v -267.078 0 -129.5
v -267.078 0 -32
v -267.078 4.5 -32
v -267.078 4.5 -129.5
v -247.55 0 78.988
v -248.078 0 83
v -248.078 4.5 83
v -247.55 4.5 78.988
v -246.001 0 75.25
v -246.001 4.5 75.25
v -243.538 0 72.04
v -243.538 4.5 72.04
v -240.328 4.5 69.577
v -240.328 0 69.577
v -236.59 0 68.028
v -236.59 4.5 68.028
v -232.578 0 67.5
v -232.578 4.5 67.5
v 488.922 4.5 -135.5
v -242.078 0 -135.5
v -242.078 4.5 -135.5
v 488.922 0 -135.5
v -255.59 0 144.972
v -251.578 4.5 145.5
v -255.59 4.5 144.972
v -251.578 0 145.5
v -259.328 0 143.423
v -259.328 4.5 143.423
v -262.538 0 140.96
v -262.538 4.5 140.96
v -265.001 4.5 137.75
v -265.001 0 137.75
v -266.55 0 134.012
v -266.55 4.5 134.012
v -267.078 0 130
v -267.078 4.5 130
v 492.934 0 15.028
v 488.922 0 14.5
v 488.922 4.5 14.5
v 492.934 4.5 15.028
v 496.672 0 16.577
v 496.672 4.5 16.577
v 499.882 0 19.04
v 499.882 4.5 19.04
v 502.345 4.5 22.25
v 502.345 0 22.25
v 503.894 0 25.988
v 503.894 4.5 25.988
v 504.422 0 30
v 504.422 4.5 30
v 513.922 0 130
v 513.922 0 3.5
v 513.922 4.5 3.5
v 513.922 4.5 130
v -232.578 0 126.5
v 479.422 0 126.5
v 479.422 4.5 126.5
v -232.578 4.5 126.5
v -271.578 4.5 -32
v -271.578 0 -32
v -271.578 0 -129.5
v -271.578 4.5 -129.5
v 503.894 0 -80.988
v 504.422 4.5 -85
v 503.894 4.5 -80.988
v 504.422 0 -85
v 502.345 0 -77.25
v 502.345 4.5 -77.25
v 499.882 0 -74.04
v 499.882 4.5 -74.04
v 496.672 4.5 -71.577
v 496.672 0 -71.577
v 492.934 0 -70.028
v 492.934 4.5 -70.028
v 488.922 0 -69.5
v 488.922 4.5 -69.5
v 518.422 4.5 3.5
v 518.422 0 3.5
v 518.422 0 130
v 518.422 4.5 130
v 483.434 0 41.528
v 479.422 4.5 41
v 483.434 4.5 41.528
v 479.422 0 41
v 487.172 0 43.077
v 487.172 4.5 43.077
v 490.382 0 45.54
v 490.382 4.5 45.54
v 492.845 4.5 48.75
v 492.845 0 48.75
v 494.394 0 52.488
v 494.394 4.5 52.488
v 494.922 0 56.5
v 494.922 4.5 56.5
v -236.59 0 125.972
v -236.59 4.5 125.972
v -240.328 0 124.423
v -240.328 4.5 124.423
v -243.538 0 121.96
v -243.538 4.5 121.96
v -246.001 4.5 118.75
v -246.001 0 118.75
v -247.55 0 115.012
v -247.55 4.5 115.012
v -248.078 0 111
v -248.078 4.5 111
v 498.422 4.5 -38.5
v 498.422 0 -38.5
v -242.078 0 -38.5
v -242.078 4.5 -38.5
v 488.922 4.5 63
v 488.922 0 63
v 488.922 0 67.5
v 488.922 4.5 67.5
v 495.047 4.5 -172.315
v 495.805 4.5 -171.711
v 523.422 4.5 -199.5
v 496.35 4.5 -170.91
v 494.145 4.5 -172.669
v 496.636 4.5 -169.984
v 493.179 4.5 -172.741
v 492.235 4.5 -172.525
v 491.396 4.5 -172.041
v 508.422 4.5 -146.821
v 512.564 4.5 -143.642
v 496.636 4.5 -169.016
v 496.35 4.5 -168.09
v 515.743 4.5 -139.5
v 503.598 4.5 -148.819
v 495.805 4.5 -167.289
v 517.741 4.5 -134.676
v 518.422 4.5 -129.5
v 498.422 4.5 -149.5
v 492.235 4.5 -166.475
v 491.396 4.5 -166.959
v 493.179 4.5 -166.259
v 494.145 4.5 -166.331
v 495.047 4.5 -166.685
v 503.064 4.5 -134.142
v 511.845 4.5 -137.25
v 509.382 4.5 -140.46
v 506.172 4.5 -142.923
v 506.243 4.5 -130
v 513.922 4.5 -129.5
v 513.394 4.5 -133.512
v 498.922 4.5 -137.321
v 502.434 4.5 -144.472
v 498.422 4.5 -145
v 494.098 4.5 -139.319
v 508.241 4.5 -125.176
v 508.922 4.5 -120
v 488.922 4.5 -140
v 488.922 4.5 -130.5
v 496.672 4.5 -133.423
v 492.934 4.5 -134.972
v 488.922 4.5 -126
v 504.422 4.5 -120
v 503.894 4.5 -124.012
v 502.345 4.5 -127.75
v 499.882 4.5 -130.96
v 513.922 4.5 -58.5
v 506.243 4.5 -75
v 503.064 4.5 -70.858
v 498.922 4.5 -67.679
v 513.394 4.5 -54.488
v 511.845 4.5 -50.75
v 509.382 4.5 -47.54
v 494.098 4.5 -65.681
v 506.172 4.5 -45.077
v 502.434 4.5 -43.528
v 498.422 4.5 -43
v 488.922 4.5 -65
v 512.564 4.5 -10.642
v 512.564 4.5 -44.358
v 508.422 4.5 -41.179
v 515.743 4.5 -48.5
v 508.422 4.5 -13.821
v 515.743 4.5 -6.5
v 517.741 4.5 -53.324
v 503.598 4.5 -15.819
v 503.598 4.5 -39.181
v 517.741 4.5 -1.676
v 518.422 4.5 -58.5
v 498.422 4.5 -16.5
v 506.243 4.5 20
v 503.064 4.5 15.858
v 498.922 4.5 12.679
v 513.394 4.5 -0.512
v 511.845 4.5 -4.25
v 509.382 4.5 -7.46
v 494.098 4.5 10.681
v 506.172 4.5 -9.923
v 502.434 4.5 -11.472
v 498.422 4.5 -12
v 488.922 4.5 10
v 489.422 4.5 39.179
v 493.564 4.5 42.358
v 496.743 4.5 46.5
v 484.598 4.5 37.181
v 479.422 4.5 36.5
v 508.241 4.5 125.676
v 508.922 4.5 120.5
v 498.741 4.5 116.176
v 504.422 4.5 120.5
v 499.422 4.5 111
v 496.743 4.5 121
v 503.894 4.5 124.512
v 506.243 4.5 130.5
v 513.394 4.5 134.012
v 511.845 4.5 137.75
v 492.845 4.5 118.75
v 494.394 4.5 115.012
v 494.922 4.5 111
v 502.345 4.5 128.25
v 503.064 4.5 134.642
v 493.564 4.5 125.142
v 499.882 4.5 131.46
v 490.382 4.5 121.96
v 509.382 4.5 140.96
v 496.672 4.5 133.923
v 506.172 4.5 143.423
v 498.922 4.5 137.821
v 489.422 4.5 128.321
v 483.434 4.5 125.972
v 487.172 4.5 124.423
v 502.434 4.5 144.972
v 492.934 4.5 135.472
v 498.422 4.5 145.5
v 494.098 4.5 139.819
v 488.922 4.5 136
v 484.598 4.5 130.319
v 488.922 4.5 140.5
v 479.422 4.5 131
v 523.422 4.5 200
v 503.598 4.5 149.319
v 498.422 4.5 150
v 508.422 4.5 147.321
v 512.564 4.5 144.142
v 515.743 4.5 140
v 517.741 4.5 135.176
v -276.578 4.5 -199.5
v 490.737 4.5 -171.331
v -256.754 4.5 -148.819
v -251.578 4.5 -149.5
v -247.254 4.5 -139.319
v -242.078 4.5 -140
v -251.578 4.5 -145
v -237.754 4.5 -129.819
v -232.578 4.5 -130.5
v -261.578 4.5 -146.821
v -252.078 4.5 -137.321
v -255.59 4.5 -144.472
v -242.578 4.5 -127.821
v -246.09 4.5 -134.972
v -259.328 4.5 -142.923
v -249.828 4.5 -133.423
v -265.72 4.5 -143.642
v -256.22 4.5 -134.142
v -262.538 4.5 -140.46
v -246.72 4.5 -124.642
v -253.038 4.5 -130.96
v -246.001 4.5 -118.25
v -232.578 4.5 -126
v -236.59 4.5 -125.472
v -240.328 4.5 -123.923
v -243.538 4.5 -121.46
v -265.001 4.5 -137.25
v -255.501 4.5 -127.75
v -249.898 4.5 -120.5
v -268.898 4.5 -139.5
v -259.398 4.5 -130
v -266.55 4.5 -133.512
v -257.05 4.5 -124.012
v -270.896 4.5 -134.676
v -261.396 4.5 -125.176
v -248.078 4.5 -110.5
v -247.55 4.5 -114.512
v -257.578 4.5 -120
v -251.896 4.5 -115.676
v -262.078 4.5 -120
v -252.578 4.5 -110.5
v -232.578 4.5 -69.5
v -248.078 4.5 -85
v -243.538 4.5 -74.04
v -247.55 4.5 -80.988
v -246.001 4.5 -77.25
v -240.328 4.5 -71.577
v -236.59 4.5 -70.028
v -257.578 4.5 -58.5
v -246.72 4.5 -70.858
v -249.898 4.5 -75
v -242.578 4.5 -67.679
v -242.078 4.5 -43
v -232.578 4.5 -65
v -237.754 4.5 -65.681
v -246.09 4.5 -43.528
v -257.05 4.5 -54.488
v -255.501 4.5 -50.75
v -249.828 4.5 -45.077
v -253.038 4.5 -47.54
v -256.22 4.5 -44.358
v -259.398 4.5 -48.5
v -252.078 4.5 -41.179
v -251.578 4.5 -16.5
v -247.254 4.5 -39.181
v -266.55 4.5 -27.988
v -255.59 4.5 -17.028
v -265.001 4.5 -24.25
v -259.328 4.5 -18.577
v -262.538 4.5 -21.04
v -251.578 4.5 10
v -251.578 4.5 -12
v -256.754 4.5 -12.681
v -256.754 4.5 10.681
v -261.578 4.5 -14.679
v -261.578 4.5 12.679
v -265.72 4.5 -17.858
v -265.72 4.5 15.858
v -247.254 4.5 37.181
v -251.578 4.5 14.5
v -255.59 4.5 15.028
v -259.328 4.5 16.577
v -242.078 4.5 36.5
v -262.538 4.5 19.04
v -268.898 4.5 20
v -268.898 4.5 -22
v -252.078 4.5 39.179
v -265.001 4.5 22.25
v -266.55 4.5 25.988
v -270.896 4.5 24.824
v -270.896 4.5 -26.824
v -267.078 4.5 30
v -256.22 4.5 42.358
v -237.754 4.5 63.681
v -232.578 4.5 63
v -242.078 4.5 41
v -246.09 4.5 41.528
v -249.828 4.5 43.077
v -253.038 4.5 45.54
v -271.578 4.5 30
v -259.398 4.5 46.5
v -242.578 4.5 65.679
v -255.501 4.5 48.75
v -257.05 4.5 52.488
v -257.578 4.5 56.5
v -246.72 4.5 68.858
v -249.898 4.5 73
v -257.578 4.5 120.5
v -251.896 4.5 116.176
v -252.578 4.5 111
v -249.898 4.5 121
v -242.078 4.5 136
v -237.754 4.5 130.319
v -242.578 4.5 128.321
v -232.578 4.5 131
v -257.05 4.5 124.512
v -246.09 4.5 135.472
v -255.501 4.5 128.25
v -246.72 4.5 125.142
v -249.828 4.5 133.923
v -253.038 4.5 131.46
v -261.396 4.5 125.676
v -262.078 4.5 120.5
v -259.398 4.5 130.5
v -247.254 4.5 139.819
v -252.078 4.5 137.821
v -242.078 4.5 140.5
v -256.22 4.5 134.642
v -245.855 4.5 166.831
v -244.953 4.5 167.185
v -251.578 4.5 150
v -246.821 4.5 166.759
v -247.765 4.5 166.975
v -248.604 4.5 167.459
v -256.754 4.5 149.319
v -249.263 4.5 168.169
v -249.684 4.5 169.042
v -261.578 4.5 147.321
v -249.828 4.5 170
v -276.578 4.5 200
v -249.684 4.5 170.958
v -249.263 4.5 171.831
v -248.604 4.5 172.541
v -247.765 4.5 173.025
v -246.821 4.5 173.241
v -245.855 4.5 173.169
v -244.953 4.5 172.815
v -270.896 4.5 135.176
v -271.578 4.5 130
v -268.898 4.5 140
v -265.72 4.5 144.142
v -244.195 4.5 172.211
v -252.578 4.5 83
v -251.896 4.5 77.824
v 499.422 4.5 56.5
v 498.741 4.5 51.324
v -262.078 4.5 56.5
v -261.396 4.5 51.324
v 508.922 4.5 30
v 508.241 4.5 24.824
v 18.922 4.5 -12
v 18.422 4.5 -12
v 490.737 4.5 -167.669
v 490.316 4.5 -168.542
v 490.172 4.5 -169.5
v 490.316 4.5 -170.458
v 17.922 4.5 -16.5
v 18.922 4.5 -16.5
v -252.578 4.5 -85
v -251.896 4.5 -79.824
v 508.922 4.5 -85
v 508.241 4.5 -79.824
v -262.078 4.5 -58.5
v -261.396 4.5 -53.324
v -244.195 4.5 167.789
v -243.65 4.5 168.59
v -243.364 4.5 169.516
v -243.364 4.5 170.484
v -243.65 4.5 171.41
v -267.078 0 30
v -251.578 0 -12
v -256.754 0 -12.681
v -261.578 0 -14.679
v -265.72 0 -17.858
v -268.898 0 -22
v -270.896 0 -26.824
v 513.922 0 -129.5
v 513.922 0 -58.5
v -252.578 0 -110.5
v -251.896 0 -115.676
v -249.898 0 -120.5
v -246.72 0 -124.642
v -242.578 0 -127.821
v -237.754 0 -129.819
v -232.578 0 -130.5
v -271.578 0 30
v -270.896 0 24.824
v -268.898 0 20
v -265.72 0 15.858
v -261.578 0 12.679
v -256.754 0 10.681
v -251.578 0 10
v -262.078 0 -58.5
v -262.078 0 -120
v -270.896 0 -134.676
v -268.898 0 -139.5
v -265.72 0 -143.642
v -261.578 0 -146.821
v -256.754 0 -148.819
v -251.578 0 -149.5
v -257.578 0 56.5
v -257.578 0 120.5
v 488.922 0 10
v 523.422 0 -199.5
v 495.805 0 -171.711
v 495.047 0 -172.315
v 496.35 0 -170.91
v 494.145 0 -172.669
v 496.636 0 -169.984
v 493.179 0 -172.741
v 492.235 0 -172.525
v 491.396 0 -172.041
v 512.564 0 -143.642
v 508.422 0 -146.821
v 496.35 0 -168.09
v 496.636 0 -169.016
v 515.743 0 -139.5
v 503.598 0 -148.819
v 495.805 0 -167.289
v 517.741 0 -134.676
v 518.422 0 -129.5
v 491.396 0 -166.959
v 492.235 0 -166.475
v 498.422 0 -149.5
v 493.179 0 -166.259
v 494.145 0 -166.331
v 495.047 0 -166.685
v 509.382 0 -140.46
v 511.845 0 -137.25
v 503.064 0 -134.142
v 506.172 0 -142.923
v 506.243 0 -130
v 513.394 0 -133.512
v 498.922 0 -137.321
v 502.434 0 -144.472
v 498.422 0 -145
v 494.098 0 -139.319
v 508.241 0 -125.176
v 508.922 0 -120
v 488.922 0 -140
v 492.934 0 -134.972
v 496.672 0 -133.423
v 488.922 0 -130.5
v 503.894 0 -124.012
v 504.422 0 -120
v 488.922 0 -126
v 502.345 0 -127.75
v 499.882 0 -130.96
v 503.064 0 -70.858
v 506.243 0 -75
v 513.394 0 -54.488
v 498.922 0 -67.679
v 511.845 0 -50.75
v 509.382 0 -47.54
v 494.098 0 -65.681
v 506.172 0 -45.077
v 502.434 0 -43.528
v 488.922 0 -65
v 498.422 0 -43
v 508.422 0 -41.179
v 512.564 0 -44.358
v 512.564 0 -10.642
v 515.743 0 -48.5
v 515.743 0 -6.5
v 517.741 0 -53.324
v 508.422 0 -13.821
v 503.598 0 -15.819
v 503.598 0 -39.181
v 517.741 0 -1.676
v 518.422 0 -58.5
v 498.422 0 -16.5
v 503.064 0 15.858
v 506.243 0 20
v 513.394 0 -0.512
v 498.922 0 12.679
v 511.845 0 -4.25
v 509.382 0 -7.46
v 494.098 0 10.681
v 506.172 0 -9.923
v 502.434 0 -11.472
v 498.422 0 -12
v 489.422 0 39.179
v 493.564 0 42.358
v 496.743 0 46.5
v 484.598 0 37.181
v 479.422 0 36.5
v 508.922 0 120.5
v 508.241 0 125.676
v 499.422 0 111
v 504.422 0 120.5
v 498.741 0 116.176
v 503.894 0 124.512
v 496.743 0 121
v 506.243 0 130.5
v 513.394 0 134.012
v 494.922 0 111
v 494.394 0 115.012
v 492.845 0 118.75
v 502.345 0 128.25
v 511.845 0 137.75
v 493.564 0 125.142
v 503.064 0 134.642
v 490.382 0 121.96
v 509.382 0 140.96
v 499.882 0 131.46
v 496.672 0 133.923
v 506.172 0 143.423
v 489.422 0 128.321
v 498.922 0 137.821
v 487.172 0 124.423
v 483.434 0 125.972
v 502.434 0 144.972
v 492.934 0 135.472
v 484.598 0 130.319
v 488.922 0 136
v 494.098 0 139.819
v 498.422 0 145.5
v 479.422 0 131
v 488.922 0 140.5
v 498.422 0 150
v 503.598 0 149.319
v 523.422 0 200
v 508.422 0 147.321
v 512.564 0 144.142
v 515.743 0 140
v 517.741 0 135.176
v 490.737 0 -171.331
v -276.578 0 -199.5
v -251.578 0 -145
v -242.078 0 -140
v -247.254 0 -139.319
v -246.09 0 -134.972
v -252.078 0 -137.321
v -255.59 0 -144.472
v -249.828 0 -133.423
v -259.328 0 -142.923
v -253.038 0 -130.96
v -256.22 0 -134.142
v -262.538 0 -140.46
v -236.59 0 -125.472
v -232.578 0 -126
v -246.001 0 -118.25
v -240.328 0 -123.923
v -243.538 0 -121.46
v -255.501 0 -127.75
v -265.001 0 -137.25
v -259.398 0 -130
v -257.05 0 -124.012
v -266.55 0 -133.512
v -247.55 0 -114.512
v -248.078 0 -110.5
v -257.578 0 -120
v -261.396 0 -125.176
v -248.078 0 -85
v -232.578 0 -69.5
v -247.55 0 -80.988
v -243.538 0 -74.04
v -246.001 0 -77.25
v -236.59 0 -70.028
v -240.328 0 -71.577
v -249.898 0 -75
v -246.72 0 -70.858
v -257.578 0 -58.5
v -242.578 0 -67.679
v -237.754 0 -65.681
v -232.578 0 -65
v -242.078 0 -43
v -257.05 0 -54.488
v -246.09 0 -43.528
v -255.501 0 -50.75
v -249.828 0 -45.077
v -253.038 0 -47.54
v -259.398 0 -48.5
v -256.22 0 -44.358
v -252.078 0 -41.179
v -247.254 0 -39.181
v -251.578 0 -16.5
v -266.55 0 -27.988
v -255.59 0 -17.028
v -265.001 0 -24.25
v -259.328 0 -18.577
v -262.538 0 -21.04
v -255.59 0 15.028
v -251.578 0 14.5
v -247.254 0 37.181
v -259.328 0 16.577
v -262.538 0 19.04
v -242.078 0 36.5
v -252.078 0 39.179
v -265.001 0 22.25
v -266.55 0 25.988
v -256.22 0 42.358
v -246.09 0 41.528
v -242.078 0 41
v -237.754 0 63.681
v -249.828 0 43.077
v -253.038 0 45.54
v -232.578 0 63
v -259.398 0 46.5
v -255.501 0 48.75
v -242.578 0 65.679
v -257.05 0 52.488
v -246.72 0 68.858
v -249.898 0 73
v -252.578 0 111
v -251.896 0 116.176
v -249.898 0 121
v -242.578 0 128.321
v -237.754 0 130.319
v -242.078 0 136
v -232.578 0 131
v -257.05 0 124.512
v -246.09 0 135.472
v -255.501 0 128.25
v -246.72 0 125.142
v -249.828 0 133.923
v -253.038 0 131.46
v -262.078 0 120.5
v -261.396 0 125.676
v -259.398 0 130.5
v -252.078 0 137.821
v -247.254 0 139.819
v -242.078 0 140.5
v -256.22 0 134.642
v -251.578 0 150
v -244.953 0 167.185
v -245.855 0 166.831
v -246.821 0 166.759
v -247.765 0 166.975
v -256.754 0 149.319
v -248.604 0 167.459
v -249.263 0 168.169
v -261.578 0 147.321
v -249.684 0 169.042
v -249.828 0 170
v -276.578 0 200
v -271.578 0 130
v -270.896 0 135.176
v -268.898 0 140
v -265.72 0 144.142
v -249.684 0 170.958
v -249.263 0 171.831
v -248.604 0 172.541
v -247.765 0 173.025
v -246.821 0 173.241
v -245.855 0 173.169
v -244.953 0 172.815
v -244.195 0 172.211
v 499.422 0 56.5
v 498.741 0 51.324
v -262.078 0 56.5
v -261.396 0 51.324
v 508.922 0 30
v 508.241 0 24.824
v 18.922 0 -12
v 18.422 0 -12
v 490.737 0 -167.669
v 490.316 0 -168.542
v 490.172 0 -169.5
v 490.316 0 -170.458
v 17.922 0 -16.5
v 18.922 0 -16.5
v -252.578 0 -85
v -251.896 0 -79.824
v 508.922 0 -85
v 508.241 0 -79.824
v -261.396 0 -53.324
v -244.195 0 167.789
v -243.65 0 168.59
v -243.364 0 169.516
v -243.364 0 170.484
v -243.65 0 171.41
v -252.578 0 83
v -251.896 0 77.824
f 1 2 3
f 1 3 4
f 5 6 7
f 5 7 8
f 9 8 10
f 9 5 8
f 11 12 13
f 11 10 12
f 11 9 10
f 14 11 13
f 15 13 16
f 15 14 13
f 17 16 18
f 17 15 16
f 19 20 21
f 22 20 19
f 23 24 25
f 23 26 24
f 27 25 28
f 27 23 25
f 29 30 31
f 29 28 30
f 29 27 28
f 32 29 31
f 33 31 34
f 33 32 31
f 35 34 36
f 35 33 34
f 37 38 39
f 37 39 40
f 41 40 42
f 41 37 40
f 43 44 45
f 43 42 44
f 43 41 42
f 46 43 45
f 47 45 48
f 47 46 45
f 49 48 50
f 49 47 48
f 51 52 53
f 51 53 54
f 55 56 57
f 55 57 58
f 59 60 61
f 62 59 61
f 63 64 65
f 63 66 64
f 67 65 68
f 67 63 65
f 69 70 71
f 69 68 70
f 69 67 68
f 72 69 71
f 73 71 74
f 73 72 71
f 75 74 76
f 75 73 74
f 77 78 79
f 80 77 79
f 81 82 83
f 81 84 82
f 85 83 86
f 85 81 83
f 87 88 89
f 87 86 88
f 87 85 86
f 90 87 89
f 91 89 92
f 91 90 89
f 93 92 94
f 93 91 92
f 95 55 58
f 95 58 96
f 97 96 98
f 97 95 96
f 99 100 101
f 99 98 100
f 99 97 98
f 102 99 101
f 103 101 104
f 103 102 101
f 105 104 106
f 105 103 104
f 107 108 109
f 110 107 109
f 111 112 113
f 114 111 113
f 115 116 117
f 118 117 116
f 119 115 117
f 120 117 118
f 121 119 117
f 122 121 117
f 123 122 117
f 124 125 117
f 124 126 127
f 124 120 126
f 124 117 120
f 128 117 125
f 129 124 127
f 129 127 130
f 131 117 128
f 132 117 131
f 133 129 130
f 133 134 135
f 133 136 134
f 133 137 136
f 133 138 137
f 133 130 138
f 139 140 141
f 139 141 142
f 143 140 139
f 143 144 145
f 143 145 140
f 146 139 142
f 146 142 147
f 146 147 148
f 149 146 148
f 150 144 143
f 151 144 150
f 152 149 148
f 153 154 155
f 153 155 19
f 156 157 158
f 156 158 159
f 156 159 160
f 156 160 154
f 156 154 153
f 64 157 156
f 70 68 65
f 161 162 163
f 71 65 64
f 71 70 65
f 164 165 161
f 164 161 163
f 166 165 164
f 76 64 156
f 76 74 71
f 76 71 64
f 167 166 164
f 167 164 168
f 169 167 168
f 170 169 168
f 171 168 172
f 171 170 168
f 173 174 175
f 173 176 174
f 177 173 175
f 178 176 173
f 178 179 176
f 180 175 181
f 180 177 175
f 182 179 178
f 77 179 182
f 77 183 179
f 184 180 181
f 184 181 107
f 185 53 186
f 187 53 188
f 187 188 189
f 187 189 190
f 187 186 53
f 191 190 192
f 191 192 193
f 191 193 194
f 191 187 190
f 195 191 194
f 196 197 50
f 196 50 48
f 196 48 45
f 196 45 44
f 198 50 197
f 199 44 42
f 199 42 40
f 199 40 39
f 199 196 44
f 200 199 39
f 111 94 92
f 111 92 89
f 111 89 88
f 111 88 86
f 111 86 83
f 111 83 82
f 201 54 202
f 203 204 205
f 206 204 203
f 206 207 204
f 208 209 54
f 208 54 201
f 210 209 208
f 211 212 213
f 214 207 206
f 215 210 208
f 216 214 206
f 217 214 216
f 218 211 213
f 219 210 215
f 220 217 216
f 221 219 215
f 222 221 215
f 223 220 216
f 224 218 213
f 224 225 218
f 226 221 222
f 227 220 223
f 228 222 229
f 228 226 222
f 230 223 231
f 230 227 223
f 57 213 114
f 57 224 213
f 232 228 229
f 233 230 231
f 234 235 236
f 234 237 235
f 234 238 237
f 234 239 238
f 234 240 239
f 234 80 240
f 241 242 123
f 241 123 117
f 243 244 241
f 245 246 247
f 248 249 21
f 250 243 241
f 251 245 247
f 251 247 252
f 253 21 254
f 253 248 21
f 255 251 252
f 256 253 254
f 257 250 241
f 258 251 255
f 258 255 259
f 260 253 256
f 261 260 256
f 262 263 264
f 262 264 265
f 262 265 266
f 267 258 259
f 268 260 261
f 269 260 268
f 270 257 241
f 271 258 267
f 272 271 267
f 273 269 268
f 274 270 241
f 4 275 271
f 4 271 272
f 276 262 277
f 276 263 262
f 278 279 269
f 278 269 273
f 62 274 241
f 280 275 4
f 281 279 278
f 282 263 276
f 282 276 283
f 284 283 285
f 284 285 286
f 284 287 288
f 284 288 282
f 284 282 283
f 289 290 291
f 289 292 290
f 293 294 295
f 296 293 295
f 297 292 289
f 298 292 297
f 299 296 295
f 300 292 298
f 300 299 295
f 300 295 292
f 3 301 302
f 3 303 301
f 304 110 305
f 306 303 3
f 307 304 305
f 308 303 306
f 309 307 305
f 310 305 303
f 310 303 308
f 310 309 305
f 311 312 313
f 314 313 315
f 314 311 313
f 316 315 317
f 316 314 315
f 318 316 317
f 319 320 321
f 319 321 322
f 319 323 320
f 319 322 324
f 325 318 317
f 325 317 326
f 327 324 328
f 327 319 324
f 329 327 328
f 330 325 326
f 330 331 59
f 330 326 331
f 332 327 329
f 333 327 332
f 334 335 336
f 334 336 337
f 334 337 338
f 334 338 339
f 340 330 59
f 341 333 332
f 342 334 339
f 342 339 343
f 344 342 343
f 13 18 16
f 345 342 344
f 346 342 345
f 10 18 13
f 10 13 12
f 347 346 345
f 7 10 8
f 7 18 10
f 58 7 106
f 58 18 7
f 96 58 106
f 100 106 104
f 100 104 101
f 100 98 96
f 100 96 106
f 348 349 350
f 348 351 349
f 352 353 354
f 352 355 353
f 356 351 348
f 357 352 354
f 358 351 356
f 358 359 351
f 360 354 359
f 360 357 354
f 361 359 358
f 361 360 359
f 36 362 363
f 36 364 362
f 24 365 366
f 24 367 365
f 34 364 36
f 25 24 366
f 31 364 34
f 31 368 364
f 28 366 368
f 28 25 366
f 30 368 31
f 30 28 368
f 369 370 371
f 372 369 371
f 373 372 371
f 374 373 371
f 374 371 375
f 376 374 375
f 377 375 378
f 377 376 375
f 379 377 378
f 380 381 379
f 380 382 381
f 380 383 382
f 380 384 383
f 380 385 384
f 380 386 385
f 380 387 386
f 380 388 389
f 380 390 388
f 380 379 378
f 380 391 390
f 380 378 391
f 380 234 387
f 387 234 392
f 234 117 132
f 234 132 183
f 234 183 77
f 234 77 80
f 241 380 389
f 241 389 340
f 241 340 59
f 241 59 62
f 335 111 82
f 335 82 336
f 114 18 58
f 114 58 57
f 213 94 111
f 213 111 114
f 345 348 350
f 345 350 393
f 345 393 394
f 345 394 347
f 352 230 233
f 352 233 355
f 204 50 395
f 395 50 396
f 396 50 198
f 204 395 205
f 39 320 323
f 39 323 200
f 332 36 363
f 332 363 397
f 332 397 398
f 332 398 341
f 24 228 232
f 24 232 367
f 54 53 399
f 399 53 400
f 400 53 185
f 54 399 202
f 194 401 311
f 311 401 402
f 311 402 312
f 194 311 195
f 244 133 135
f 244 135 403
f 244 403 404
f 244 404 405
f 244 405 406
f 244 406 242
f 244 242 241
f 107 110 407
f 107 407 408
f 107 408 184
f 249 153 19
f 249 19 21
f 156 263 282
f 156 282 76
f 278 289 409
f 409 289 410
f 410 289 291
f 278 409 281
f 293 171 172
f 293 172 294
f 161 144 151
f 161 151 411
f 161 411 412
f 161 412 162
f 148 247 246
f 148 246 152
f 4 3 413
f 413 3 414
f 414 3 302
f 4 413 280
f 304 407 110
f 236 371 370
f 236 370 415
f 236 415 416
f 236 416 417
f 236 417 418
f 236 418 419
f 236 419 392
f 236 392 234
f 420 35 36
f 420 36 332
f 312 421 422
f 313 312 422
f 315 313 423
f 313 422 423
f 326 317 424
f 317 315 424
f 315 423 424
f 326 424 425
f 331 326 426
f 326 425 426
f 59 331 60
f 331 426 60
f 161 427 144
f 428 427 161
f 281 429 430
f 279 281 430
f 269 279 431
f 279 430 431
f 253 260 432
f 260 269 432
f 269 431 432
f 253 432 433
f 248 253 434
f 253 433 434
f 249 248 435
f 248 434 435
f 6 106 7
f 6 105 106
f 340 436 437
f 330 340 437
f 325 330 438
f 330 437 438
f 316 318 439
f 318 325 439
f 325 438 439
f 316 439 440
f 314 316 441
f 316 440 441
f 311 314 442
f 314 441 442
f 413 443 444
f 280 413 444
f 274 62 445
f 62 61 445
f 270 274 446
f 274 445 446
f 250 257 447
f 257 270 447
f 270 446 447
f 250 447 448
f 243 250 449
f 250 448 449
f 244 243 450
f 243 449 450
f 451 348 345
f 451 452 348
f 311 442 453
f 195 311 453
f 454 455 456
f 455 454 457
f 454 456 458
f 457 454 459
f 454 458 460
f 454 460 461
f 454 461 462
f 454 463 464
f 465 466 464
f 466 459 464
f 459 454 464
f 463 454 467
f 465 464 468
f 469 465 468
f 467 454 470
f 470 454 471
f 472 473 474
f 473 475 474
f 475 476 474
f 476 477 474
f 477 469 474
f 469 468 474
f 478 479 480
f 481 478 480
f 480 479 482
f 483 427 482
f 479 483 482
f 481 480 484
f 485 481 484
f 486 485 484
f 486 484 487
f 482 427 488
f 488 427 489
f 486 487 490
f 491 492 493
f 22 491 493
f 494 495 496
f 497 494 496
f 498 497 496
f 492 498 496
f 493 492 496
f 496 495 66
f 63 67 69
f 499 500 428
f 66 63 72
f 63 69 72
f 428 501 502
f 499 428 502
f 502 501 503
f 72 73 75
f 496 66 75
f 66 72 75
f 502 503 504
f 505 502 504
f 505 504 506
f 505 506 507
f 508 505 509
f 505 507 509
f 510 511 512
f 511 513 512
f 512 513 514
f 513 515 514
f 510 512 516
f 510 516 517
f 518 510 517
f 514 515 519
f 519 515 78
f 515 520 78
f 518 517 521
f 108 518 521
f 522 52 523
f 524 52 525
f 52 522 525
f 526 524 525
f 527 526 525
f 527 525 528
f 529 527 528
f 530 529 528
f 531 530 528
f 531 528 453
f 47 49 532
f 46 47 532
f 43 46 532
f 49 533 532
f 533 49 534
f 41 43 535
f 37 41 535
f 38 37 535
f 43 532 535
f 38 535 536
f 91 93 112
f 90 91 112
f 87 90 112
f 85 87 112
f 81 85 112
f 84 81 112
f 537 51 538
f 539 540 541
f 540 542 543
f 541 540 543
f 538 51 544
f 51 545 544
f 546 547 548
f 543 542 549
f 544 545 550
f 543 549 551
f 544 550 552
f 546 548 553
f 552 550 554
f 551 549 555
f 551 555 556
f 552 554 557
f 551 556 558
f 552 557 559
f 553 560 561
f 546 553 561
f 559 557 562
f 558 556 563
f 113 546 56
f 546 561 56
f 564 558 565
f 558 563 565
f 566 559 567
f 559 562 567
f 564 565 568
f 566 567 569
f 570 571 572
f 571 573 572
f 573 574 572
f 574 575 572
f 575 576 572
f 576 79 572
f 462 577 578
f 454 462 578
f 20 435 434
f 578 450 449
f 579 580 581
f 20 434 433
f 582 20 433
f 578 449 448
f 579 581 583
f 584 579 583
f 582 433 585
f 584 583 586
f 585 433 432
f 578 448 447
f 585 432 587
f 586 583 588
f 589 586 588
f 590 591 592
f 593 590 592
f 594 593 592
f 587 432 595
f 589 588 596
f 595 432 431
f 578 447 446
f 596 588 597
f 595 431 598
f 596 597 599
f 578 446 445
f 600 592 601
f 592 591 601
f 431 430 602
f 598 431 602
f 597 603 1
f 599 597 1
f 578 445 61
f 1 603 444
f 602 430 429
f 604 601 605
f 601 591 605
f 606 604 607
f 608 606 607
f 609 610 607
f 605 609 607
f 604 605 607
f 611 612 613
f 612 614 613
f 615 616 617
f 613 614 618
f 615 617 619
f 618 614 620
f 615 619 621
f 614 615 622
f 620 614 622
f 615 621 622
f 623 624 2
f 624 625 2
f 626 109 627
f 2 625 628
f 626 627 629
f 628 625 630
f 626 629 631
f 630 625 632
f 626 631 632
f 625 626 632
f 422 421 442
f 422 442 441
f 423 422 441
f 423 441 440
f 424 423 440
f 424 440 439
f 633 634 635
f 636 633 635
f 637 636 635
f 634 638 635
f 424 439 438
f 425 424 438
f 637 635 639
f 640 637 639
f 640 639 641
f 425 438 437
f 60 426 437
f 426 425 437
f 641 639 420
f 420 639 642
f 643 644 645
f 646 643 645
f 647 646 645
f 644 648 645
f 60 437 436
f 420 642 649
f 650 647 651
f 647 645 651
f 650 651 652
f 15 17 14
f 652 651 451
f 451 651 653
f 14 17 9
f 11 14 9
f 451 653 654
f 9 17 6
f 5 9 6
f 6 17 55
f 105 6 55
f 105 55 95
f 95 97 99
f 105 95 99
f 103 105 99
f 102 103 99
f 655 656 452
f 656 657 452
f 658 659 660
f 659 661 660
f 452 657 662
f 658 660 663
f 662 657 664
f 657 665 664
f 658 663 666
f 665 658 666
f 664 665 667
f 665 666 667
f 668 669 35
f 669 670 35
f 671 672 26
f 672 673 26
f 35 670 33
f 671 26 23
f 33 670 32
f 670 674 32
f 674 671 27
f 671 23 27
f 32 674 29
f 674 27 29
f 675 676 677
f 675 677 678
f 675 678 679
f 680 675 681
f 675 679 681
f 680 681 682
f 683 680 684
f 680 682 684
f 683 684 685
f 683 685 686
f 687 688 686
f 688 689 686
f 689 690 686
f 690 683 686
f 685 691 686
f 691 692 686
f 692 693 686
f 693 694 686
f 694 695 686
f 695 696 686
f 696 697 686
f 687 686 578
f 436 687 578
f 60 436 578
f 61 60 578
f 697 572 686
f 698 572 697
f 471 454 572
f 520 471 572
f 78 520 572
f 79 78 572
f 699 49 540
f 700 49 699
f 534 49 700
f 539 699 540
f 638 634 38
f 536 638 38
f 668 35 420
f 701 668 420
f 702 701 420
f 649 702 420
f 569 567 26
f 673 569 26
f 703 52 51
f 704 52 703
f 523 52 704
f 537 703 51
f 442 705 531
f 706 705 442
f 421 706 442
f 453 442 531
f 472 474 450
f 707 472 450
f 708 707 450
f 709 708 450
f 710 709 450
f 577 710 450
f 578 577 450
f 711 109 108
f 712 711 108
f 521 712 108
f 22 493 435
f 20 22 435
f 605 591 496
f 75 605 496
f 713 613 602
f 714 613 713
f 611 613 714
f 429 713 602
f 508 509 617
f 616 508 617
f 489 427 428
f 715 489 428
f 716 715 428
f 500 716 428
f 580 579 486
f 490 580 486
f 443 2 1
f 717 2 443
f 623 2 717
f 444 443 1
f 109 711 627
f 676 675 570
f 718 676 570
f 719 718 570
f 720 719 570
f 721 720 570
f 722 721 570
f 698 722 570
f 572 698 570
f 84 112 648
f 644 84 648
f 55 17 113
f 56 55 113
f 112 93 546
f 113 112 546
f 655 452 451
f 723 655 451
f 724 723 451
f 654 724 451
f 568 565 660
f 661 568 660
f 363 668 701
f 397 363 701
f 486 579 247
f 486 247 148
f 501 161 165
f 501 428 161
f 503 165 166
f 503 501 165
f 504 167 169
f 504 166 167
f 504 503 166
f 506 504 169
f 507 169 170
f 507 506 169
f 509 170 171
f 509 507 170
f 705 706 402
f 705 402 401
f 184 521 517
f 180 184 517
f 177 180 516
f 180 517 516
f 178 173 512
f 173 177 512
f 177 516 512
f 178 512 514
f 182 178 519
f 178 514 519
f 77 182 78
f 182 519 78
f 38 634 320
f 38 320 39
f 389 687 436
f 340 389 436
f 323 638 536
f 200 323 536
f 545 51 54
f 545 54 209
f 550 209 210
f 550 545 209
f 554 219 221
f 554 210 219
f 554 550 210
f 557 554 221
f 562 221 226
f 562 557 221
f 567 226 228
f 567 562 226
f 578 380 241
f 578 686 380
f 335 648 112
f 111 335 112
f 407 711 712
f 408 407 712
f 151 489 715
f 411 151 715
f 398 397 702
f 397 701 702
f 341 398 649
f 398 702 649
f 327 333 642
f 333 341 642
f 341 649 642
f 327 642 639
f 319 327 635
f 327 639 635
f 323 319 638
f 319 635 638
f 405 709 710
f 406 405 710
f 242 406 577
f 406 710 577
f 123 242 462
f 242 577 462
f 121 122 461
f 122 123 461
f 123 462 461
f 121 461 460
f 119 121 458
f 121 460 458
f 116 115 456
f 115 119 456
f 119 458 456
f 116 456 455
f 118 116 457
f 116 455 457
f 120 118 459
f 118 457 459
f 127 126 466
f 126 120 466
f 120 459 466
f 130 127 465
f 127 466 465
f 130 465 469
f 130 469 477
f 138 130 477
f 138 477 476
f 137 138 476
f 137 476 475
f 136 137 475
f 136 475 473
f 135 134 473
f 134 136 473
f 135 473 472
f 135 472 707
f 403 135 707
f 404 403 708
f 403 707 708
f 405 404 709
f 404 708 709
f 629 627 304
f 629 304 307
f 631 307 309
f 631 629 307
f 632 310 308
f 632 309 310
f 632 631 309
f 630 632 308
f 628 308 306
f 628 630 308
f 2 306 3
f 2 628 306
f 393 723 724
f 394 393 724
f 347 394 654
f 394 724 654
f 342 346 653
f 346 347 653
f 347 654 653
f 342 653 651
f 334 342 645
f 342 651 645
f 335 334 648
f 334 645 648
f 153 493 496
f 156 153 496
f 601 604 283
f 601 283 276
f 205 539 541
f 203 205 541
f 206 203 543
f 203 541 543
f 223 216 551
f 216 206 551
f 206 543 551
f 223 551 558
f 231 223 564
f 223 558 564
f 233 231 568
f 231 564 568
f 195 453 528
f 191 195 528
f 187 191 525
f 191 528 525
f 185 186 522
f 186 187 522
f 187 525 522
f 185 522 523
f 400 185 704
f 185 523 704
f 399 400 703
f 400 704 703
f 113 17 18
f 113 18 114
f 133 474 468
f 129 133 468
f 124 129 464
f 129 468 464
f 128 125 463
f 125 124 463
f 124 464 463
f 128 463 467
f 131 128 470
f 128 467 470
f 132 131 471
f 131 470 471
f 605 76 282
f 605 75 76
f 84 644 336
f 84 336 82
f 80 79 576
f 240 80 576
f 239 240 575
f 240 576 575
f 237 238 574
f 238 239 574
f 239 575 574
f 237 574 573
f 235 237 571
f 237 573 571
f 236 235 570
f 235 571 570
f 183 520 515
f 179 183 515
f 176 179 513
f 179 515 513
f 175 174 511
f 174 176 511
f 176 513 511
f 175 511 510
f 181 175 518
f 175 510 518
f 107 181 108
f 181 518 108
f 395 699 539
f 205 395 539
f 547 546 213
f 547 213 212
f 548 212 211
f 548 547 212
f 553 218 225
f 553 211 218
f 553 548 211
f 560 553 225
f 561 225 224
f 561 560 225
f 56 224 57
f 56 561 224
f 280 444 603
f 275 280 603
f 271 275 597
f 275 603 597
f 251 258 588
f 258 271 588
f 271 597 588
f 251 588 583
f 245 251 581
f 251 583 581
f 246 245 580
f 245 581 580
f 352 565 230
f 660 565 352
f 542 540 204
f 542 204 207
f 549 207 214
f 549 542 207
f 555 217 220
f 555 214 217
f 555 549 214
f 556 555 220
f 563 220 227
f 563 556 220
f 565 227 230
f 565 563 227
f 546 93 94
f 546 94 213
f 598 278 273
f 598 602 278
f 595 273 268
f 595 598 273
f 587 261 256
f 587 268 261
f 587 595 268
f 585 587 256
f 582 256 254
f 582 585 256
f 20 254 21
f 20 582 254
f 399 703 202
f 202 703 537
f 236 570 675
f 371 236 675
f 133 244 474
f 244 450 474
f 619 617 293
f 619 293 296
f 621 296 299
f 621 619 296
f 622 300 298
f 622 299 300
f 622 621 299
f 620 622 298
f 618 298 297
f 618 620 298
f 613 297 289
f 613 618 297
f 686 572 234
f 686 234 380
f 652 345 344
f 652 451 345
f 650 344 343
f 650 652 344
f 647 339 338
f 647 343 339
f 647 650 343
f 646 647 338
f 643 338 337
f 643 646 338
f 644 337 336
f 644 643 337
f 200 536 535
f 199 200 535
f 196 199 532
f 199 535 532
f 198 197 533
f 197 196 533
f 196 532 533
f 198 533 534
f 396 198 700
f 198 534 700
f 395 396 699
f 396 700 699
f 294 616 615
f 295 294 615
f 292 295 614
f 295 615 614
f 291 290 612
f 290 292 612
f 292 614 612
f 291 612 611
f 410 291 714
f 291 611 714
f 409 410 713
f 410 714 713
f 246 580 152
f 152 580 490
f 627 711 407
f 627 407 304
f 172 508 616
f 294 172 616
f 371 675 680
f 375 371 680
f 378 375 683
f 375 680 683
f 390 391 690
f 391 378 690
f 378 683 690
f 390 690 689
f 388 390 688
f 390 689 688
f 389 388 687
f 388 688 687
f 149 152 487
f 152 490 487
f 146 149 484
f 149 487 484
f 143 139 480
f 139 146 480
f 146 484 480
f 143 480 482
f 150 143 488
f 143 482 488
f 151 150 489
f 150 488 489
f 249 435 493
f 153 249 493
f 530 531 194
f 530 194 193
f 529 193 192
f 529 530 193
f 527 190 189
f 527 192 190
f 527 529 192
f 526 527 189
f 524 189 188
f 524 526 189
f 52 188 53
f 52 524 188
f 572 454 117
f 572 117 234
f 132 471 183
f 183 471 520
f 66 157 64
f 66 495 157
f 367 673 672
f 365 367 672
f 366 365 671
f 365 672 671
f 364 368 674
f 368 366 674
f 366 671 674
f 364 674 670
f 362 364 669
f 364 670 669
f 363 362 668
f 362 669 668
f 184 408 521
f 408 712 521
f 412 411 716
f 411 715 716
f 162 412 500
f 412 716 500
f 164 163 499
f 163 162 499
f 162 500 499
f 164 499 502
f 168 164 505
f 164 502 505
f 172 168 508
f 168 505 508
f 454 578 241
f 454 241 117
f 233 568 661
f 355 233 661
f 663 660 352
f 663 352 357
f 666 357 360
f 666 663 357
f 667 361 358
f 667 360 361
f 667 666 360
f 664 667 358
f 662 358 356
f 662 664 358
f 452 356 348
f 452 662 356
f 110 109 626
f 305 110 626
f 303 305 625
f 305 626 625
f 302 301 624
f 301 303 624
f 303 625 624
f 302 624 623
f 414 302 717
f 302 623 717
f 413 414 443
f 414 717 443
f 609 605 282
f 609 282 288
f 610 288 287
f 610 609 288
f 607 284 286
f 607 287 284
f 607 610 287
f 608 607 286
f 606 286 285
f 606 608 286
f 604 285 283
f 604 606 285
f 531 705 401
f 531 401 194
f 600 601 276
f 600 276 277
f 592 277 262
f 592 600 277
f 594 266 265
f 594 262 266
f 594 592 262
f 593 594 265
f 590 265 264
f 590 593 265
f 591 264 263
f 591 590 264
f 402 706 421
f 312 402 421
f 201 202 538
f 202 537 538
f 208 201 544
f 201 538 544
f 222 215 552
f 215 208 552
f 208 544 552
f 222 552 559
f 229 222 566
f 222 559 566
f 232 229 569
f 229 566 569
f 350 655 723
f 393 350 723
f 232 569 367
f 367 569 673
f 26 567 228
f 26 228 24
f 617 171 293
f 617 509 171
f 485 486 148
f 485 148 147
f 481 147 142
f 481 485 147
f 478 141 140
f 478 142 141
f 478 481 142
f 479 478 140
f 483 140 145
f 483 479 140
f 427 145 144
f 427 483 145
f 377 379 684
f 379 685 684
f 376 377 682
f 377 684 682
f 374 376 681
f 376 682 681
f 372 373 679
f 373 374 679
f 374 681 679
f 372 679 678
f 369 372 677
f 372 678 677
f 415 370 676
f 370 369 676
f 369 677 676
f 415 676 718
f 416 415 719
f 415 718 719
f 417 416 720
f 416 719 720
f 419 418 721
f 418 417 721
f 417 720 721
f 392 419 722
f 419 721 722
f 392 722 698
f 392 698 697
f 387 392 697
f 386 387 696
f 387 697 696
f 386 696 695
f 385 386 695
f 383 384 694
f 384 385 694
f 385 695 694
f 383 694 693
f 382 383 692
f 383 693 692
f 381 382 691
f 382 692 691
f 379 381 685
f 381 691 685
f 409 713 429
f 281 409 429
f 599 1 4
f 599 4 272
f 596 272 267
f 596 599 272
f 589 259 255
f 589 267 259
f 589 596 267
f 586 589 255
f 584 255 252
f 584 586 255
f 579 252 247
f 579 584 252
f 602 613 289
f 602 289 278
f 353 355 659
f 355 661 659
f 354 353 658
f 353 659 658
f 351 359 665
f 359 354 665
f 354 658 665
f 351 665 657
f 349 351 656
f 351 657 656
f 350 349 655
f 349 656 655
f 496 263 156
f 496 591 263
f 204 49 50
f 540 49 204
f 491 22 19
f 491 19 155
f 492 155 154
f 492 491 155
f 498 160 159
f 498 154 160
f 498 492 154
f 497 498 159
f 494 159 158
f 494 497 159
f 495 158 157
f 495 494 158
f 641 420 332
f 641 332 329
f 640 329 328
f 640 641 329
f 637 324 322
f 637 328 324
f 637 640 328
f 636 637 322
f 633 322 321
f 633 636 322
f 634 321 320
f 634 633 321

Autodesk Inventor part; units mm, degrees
ref_plane "YZ Plane" through (0, 0, 0) normal (1, 0, 0) x (0, 1, 0)
ref_plane "XZ Plane" through (0, 0, 0) normal (0, 1, 0) x (-1, 0, 0)
ref_plane "XY Plane" through (0, 0, 0) normal (0, 0, 1) x (1, 0, 0)
sketch "Sketch1" plane through (0, 0, 0) normal (0, 1, 0) x (-1, 0, 0)
  line L0 (-17.9221, -16.5) -> (-498.4221, -16.5)
  line L1 (-518.4221, 3.5) -> (-518.4221, 130)
  line L2 (-498.4221, 150) -> (251.5779, 150)
  line L3 (271.5779, 130) -> (271.5779, 30)
  line L4 (-18.4221, -12) -> (-498.4221, -12)
  line L5 (-513.9221, 3.5) -> (-513.9221, 130)
  line L6 (-498.4221, 145.5) -> (251.5779, 145.5)
  line L7 (267.0779, 130) -> (267.0779, 30)
  line L8 (251.5779, 14.5) -> (-488.9221, 14.5)
  line L9 (-504.4221, 30) -> (-504.4221, 120.5)
  line L10 (251.5779, 10) -> (-488.9221, 10)
  line L11 (-508.9221, 30) -> (-508.9221, 120.5)
  line L12 (-488.9221, 136) -> (242.0779, 136)
  line L13 (-488.9221, 140.5) -> (242.0779, 140.5)
  line L14 (257.5779, 120.5) -> (257.5779, 56.5)
  line L15 (242.0779, 41) -> (-479.4221, 41)
  line L16 (262.0779, 120.5) -> (262.0779, 56.5)
  line L17 (242.0779, 36.5) -> (-479.4221, 36.5)
  line L18 (-494.9221, 56.5) -> (-494.9221, 111)
  line L19 (-479.4221, 126.5) -> (232.5779, 126.5)
  line L20 (248.0779, 111) -> (248.0779, 83)
  line L21 (232.5779, 67.5) -> (-488.9221, 67.5)
  line L22 (-499.4221, 56.5) -> (-499.4221, 111)
  line L23 (-479.4221, 131) -> (232.5779, 131)
  line L24 (252.5779, 111) -> (252.5779, 83)
  line L25 (232.5779, 63) -> (-488.9221, 63)
  line L26 (-122.9221, 150) -> (-122.9221, -150) construction
  line L27 (-18.9221, -12) -> (251.5779, -12)
  line L28 (271.5779, -32) -> (271.5779, -129.5)
  line L29 (251.5779, -149.5) -> (-498.4221, -149.5)
  line L30 (-518.4221, -129.5) -> (-518.4221, -58.5)
  line L31 (-18.9221, -16.5) -> (251.5779, -16.5)
  line L32 (267.0779, -32) -> (267.0779, -129.5)
  line L33 (251.5779, -145) -> (-498.4221, -145)
  line L34 (-498.4221, -38.5) -> (242.0779, -38.5)
  line L35 (262.0779, -58.5) -> (262.0779, -120)
  line L36 (242.0779, -140) -> (-488.9221, -140)
  line L37 (-513.9221, -129.5) -> (-513.9221, -58.5)
  line L38 (-498.4221, -43) -> (242.0779, -43)
  line L39 (257.5779, -58.5) -> (257.5779, -120)
  line L40 (242.0779, -135.5) -> (-488.9221, -135.5)
  line L41 (-504.4221, -120) -> (-504.4221, -85)
  line L42 (-508.9221, -120) -> (-508.9221, -85)
  line L43 (-488.9221, -65) -> (232.5779, -65)
  line L44 (252.5779, -85) -> (252.5779, -110.5)
  line L45 (-488.9221, -69.5) -> (232.5779, -69.5)
  line L46 (248.0779, -85) -> (248.0779, -110.5)
  line L47 (232.5779, -126) -> (-488.9221, -126)
  line L48 (232.5779, -130.5) -> (-488.9221, -130.5)
  line L49 (276.5779, 200.5) -> (276.5779, -199.5)
  line L50 (276.5779, -199.5) -> (-523.4221, -199.5)
  line L51 (-523.4221, -199.5) -> (-523.4221, 200)
  line L52 (-523.4221, 200) -> (276.5779, 200)
  line L53 (276.5779, 200) -> (276.5779, -199.5)
  arc A0 (251.5779, -149.5) -> (271.5779, -129.5) centre (251.5779, -129.5) ccw
  arc A1 (251.5779, -145) -> (267.0779, -129.5) centre (251.5779, -129.5) ccw
  arc A2 (242.0779, -135.5) -> (257.5779, -120) centre (242.0779, -120) ccw
  arc A3 (242.0779, -140) -> (262.0779, -120) centre (242.0779, -120) ccw
  arc A4 (232.5779, -130.5) -> (252.5779, -110.5) centre (232.5779, -110.5) ccw
  arc A5 (232.5779, -126) -> (248.0779, -110.5) centre (232.5779, -110.5) ccw
  arc A6 (248.0779, -85) -> (232.5779, -69.5) centre (232.5779, -85) ccw
  arc A7 (252.5779, -85) -> (232.5779, -65) centre (232.5779, -85) ccw
  line L54 (266.0656, -58.5) -> (242.0779, -58.5) construction
  line L55 (242.0779, -58.5) -> (242.0779, -27) construction
  arc A8 (257.5779, -58.5) -> (242.0779, -43) centre (242.0779, -58.5) ccw
  arc A9 (262.0779, -58.5) -> (242.0779, -38.5) centre (242.0779, -58.5) ccw
  line L56 (251.5779, -3.7302) -> (251.5779, -32) construction
  line L57 (251.5779, -32) -> (272.6377, -32) construction
  arc A10 (267.0779, -32) -> (251.5779, -16.5) centre (251.5779, -32) ccw
  arc A11 (271.5779, -32) -> (251.5779, -12) centre (251.5779, -32) ccw
  arc A12 (-518.4221, -129.5) -> (-498.4221, -149.5) centre (-498.4221, -129.5) ccw
  arc A13 (-513.9221, -129.5) -> (-498.4221, -145) centre (-498.4221, -129.5) ccw
  arc A14 (-508.9221, -120) -> (-488.9221, -140) centre (-488.9221, -120) ccw
  line L58 (-488.9221, -130.5) -> (-488.9221, -126)
  arc A15 (-504.4221, -120) -> (-488.9221, -135.5) centre (-488.9221, -120) ccw
  arc A16 (-488.9221, -65) -> (-508.9221, -85) centre (-488.9221, -85) ccw
  arc A17 (-488.9221, -69.5) -> (-504.4221, -85) centre (-488.9221, -85) ccw
  arc A18 (-498.4221, -43) -> (-513.9221, -58.5) centre (-498.4221, -58.5) ccw
  arc A19 (-498.4221, -38.5) -> (-518.4221, -58.5) centre (-498.4221, -58.5) ccw
  line L59 (-488.9221, 63) -> (-488.9221, 67.5)
  arc A20 (-518.4221, 3.5) -> (-498.4221, -16.5) centre (-498.4221, 3.5) ccw
  arc A21 (-513.9221, 3.5) -> (-498.4221, -12) centre (-498.4221, 3.5) ccw
  arc A22 (-508.9221, 30) -> (-488.9221, 10) centre (-488.9221, 30) ccw
  arc A23 (-504.4221, 30) -> (-488.9221, 14.5) centre (-488.9221, 30) ccw
  arc A24 (-499.4221, 56.5) -> (-479.4221, 36.5) centre (-479.4221, 56.5) ccw
  arc A25 (-494.9221, 56.5) -> (-479.4221, 41) centre (-479.4221, 56.5) ccw
  arc A26 (-479.4221, 126.5) -> (-494.9221, 111) centre (-479.4221, 111) ccw
  arc A27 (-479.4221, 131) -> (-499.4221, 111) centre (-479.4221, 111) ccw
  arc A28 (-488.9221, 136) -> (-504.4221, 120.5) centre (-488.9221, 120.5) ccw
  arc A29 (-488.9221, 140.5) -> (-508.9221, 120.5) centre (-488.9221, 120.5) ccw
  arc A30 (-498.4221, 145.5) -> (-513.9221, 130) centre (-498.4221, 130) ccw
  arc A31 (-498.4221, 150) -> (-518.4221, 130) centre (-498.4221, 130) ccw
  arc A32 (251.5779, 10) -> (271.5779, 30) centre (251.5779, 30) ccw
  arc A33 (251.5779, 14.5) -> (267.0779, 30) centre (251.5779, 30) ccw
  arc A34 (242.0779, 41) -> (257.5779, 56.5) centre (242.0779, 56.5) ccw
  arc A35 (242.0779, 36.5) -> (262.0779, 56.5) centre (242.0779, 56.5) ccw
  arc A36 (232.5779, 63) -> (252.5779, 83) centre (232.5779, 83) ccw
  arc A37 (232.5779, 67.5) -> (248.0779, 83) centre (232.5779, 83) ccw
  arc A38 (248.0779, 111) -> (232.5779, 126.5) centre (232.5779, 111) ccw
  arc A39 (252.5779, 111) -> (232.5779, 131) centre (232.5779, 111) ccw
  arc A40 (257.5779, 120.5) -> (242.0779, 136) centre (242.0779, 120.5) ccw
  arc A41 (262.0779, 120.5) -> (242.0779, 140.5) centre (242.0779, 120.5) ccw
  arc A42 (267.0779, 130) -> (251.5779, 145.5) centre (251.5779, 130) ccw
  arc A43 (271.5779, 130) -> (251.5779, 150) centre (251.5779, 130) ccw
  circle A44 centre (-493.4221, -169.5) radius 3.25
  circle A45 centre (246.5779, 170) radius 3.25
  point P0 (-228.4221, 0)
  point P1 (276.5779, 200)
  point P2 (257.5779, -126)
  dimension "d2" = 4.5
  dimension "d3" = 4.5
  dimension "d4" = 4.5
  dimension "d5" = 5
  dimension "d6" = 5
  dimension "d7" = 4.5
  dimension "d8" = 4.5
  dimension "d9" = 4.5
  dimension "d10" = 5
  dimension "d11" = 790
  dimension "d12" = 22
  dimension "d13" = 4.5
  dimension "d14" = 4.5
  dimension "d15" = 22
  dimension "d16" = 5
  dimension "d17" = 5
  dimension "d18" = 4.5
  dimension "d19" = 5
  dimension "d20" = 22
  dimension "d21" = 4.5
  dimension "d22" = 4.5
  dimension "d23" = 4.5
  dimension "d30" = 4.5
  dimension "d31" = 4.5
  dimension "d32" = 4.5
  dimension "d34" = 500
  dimension "d35" = 4.5
  dimension "d36" = 4.5
  dimension "d38" = 4.5
  dimension "d39" = 22
  dimension "d40" = 4.5
  dimension "d41" = 5
  dimension "d42" = 4.5
  dimension "d43" = 4.5
  dimension "d44" = 4.5
  dimension "d46" = 22
  dimension "d47" = 5
  dimension "d48" = 4.5
  dimension "d49" = 5
  dimension "d63" = 400
  dimension "d64" = 50
  dimension "d65" = 5
  dimension "d68" = 5
  dimension "d80" = 4.5
  dimension "d81" = 0
  dimension "d103" = 5
  dimension "d126" = 30
  dimension "d127" = 6.5
  dimension "d128" = 30
  dimension "d129" = 6.5
  dimension "d130" = 30
  dimension "d131" = 30
extrude "Extrusion2" add sketch "Sketch1" along normal blind 4.5
equation "\"d6\" = d26"
equation "\"d10\" = d26"
equation "\"d15\" = d28"
equation "\"d16\" = d26"
equation "\"d19\" = d25"
equation "\"d20\" = d28"
equation "\"d34\" = 0.5 * d52"
equation "\"d41\" = d53"
equation "\"d46\" = d54"
equation "\"d47\" = d53"
equation "\"d49\" = d53"
equation "\"d25\" = 5"
equation "\"d26\" = 5"
equation "\"d28\" = -1.2 * d25 + 0.2 * d29"
equation "\"d51\" = 5"
equation "\"d53\" = 5"
equation "\"d54\" = -1.2 * d51 + 0.2 * d55"
equation "\"d29\" = 140"
equation "\"d55\" = 140"
equation "\"d52\" = 1000"
properties part number "wire_holder_lasercutting800"
